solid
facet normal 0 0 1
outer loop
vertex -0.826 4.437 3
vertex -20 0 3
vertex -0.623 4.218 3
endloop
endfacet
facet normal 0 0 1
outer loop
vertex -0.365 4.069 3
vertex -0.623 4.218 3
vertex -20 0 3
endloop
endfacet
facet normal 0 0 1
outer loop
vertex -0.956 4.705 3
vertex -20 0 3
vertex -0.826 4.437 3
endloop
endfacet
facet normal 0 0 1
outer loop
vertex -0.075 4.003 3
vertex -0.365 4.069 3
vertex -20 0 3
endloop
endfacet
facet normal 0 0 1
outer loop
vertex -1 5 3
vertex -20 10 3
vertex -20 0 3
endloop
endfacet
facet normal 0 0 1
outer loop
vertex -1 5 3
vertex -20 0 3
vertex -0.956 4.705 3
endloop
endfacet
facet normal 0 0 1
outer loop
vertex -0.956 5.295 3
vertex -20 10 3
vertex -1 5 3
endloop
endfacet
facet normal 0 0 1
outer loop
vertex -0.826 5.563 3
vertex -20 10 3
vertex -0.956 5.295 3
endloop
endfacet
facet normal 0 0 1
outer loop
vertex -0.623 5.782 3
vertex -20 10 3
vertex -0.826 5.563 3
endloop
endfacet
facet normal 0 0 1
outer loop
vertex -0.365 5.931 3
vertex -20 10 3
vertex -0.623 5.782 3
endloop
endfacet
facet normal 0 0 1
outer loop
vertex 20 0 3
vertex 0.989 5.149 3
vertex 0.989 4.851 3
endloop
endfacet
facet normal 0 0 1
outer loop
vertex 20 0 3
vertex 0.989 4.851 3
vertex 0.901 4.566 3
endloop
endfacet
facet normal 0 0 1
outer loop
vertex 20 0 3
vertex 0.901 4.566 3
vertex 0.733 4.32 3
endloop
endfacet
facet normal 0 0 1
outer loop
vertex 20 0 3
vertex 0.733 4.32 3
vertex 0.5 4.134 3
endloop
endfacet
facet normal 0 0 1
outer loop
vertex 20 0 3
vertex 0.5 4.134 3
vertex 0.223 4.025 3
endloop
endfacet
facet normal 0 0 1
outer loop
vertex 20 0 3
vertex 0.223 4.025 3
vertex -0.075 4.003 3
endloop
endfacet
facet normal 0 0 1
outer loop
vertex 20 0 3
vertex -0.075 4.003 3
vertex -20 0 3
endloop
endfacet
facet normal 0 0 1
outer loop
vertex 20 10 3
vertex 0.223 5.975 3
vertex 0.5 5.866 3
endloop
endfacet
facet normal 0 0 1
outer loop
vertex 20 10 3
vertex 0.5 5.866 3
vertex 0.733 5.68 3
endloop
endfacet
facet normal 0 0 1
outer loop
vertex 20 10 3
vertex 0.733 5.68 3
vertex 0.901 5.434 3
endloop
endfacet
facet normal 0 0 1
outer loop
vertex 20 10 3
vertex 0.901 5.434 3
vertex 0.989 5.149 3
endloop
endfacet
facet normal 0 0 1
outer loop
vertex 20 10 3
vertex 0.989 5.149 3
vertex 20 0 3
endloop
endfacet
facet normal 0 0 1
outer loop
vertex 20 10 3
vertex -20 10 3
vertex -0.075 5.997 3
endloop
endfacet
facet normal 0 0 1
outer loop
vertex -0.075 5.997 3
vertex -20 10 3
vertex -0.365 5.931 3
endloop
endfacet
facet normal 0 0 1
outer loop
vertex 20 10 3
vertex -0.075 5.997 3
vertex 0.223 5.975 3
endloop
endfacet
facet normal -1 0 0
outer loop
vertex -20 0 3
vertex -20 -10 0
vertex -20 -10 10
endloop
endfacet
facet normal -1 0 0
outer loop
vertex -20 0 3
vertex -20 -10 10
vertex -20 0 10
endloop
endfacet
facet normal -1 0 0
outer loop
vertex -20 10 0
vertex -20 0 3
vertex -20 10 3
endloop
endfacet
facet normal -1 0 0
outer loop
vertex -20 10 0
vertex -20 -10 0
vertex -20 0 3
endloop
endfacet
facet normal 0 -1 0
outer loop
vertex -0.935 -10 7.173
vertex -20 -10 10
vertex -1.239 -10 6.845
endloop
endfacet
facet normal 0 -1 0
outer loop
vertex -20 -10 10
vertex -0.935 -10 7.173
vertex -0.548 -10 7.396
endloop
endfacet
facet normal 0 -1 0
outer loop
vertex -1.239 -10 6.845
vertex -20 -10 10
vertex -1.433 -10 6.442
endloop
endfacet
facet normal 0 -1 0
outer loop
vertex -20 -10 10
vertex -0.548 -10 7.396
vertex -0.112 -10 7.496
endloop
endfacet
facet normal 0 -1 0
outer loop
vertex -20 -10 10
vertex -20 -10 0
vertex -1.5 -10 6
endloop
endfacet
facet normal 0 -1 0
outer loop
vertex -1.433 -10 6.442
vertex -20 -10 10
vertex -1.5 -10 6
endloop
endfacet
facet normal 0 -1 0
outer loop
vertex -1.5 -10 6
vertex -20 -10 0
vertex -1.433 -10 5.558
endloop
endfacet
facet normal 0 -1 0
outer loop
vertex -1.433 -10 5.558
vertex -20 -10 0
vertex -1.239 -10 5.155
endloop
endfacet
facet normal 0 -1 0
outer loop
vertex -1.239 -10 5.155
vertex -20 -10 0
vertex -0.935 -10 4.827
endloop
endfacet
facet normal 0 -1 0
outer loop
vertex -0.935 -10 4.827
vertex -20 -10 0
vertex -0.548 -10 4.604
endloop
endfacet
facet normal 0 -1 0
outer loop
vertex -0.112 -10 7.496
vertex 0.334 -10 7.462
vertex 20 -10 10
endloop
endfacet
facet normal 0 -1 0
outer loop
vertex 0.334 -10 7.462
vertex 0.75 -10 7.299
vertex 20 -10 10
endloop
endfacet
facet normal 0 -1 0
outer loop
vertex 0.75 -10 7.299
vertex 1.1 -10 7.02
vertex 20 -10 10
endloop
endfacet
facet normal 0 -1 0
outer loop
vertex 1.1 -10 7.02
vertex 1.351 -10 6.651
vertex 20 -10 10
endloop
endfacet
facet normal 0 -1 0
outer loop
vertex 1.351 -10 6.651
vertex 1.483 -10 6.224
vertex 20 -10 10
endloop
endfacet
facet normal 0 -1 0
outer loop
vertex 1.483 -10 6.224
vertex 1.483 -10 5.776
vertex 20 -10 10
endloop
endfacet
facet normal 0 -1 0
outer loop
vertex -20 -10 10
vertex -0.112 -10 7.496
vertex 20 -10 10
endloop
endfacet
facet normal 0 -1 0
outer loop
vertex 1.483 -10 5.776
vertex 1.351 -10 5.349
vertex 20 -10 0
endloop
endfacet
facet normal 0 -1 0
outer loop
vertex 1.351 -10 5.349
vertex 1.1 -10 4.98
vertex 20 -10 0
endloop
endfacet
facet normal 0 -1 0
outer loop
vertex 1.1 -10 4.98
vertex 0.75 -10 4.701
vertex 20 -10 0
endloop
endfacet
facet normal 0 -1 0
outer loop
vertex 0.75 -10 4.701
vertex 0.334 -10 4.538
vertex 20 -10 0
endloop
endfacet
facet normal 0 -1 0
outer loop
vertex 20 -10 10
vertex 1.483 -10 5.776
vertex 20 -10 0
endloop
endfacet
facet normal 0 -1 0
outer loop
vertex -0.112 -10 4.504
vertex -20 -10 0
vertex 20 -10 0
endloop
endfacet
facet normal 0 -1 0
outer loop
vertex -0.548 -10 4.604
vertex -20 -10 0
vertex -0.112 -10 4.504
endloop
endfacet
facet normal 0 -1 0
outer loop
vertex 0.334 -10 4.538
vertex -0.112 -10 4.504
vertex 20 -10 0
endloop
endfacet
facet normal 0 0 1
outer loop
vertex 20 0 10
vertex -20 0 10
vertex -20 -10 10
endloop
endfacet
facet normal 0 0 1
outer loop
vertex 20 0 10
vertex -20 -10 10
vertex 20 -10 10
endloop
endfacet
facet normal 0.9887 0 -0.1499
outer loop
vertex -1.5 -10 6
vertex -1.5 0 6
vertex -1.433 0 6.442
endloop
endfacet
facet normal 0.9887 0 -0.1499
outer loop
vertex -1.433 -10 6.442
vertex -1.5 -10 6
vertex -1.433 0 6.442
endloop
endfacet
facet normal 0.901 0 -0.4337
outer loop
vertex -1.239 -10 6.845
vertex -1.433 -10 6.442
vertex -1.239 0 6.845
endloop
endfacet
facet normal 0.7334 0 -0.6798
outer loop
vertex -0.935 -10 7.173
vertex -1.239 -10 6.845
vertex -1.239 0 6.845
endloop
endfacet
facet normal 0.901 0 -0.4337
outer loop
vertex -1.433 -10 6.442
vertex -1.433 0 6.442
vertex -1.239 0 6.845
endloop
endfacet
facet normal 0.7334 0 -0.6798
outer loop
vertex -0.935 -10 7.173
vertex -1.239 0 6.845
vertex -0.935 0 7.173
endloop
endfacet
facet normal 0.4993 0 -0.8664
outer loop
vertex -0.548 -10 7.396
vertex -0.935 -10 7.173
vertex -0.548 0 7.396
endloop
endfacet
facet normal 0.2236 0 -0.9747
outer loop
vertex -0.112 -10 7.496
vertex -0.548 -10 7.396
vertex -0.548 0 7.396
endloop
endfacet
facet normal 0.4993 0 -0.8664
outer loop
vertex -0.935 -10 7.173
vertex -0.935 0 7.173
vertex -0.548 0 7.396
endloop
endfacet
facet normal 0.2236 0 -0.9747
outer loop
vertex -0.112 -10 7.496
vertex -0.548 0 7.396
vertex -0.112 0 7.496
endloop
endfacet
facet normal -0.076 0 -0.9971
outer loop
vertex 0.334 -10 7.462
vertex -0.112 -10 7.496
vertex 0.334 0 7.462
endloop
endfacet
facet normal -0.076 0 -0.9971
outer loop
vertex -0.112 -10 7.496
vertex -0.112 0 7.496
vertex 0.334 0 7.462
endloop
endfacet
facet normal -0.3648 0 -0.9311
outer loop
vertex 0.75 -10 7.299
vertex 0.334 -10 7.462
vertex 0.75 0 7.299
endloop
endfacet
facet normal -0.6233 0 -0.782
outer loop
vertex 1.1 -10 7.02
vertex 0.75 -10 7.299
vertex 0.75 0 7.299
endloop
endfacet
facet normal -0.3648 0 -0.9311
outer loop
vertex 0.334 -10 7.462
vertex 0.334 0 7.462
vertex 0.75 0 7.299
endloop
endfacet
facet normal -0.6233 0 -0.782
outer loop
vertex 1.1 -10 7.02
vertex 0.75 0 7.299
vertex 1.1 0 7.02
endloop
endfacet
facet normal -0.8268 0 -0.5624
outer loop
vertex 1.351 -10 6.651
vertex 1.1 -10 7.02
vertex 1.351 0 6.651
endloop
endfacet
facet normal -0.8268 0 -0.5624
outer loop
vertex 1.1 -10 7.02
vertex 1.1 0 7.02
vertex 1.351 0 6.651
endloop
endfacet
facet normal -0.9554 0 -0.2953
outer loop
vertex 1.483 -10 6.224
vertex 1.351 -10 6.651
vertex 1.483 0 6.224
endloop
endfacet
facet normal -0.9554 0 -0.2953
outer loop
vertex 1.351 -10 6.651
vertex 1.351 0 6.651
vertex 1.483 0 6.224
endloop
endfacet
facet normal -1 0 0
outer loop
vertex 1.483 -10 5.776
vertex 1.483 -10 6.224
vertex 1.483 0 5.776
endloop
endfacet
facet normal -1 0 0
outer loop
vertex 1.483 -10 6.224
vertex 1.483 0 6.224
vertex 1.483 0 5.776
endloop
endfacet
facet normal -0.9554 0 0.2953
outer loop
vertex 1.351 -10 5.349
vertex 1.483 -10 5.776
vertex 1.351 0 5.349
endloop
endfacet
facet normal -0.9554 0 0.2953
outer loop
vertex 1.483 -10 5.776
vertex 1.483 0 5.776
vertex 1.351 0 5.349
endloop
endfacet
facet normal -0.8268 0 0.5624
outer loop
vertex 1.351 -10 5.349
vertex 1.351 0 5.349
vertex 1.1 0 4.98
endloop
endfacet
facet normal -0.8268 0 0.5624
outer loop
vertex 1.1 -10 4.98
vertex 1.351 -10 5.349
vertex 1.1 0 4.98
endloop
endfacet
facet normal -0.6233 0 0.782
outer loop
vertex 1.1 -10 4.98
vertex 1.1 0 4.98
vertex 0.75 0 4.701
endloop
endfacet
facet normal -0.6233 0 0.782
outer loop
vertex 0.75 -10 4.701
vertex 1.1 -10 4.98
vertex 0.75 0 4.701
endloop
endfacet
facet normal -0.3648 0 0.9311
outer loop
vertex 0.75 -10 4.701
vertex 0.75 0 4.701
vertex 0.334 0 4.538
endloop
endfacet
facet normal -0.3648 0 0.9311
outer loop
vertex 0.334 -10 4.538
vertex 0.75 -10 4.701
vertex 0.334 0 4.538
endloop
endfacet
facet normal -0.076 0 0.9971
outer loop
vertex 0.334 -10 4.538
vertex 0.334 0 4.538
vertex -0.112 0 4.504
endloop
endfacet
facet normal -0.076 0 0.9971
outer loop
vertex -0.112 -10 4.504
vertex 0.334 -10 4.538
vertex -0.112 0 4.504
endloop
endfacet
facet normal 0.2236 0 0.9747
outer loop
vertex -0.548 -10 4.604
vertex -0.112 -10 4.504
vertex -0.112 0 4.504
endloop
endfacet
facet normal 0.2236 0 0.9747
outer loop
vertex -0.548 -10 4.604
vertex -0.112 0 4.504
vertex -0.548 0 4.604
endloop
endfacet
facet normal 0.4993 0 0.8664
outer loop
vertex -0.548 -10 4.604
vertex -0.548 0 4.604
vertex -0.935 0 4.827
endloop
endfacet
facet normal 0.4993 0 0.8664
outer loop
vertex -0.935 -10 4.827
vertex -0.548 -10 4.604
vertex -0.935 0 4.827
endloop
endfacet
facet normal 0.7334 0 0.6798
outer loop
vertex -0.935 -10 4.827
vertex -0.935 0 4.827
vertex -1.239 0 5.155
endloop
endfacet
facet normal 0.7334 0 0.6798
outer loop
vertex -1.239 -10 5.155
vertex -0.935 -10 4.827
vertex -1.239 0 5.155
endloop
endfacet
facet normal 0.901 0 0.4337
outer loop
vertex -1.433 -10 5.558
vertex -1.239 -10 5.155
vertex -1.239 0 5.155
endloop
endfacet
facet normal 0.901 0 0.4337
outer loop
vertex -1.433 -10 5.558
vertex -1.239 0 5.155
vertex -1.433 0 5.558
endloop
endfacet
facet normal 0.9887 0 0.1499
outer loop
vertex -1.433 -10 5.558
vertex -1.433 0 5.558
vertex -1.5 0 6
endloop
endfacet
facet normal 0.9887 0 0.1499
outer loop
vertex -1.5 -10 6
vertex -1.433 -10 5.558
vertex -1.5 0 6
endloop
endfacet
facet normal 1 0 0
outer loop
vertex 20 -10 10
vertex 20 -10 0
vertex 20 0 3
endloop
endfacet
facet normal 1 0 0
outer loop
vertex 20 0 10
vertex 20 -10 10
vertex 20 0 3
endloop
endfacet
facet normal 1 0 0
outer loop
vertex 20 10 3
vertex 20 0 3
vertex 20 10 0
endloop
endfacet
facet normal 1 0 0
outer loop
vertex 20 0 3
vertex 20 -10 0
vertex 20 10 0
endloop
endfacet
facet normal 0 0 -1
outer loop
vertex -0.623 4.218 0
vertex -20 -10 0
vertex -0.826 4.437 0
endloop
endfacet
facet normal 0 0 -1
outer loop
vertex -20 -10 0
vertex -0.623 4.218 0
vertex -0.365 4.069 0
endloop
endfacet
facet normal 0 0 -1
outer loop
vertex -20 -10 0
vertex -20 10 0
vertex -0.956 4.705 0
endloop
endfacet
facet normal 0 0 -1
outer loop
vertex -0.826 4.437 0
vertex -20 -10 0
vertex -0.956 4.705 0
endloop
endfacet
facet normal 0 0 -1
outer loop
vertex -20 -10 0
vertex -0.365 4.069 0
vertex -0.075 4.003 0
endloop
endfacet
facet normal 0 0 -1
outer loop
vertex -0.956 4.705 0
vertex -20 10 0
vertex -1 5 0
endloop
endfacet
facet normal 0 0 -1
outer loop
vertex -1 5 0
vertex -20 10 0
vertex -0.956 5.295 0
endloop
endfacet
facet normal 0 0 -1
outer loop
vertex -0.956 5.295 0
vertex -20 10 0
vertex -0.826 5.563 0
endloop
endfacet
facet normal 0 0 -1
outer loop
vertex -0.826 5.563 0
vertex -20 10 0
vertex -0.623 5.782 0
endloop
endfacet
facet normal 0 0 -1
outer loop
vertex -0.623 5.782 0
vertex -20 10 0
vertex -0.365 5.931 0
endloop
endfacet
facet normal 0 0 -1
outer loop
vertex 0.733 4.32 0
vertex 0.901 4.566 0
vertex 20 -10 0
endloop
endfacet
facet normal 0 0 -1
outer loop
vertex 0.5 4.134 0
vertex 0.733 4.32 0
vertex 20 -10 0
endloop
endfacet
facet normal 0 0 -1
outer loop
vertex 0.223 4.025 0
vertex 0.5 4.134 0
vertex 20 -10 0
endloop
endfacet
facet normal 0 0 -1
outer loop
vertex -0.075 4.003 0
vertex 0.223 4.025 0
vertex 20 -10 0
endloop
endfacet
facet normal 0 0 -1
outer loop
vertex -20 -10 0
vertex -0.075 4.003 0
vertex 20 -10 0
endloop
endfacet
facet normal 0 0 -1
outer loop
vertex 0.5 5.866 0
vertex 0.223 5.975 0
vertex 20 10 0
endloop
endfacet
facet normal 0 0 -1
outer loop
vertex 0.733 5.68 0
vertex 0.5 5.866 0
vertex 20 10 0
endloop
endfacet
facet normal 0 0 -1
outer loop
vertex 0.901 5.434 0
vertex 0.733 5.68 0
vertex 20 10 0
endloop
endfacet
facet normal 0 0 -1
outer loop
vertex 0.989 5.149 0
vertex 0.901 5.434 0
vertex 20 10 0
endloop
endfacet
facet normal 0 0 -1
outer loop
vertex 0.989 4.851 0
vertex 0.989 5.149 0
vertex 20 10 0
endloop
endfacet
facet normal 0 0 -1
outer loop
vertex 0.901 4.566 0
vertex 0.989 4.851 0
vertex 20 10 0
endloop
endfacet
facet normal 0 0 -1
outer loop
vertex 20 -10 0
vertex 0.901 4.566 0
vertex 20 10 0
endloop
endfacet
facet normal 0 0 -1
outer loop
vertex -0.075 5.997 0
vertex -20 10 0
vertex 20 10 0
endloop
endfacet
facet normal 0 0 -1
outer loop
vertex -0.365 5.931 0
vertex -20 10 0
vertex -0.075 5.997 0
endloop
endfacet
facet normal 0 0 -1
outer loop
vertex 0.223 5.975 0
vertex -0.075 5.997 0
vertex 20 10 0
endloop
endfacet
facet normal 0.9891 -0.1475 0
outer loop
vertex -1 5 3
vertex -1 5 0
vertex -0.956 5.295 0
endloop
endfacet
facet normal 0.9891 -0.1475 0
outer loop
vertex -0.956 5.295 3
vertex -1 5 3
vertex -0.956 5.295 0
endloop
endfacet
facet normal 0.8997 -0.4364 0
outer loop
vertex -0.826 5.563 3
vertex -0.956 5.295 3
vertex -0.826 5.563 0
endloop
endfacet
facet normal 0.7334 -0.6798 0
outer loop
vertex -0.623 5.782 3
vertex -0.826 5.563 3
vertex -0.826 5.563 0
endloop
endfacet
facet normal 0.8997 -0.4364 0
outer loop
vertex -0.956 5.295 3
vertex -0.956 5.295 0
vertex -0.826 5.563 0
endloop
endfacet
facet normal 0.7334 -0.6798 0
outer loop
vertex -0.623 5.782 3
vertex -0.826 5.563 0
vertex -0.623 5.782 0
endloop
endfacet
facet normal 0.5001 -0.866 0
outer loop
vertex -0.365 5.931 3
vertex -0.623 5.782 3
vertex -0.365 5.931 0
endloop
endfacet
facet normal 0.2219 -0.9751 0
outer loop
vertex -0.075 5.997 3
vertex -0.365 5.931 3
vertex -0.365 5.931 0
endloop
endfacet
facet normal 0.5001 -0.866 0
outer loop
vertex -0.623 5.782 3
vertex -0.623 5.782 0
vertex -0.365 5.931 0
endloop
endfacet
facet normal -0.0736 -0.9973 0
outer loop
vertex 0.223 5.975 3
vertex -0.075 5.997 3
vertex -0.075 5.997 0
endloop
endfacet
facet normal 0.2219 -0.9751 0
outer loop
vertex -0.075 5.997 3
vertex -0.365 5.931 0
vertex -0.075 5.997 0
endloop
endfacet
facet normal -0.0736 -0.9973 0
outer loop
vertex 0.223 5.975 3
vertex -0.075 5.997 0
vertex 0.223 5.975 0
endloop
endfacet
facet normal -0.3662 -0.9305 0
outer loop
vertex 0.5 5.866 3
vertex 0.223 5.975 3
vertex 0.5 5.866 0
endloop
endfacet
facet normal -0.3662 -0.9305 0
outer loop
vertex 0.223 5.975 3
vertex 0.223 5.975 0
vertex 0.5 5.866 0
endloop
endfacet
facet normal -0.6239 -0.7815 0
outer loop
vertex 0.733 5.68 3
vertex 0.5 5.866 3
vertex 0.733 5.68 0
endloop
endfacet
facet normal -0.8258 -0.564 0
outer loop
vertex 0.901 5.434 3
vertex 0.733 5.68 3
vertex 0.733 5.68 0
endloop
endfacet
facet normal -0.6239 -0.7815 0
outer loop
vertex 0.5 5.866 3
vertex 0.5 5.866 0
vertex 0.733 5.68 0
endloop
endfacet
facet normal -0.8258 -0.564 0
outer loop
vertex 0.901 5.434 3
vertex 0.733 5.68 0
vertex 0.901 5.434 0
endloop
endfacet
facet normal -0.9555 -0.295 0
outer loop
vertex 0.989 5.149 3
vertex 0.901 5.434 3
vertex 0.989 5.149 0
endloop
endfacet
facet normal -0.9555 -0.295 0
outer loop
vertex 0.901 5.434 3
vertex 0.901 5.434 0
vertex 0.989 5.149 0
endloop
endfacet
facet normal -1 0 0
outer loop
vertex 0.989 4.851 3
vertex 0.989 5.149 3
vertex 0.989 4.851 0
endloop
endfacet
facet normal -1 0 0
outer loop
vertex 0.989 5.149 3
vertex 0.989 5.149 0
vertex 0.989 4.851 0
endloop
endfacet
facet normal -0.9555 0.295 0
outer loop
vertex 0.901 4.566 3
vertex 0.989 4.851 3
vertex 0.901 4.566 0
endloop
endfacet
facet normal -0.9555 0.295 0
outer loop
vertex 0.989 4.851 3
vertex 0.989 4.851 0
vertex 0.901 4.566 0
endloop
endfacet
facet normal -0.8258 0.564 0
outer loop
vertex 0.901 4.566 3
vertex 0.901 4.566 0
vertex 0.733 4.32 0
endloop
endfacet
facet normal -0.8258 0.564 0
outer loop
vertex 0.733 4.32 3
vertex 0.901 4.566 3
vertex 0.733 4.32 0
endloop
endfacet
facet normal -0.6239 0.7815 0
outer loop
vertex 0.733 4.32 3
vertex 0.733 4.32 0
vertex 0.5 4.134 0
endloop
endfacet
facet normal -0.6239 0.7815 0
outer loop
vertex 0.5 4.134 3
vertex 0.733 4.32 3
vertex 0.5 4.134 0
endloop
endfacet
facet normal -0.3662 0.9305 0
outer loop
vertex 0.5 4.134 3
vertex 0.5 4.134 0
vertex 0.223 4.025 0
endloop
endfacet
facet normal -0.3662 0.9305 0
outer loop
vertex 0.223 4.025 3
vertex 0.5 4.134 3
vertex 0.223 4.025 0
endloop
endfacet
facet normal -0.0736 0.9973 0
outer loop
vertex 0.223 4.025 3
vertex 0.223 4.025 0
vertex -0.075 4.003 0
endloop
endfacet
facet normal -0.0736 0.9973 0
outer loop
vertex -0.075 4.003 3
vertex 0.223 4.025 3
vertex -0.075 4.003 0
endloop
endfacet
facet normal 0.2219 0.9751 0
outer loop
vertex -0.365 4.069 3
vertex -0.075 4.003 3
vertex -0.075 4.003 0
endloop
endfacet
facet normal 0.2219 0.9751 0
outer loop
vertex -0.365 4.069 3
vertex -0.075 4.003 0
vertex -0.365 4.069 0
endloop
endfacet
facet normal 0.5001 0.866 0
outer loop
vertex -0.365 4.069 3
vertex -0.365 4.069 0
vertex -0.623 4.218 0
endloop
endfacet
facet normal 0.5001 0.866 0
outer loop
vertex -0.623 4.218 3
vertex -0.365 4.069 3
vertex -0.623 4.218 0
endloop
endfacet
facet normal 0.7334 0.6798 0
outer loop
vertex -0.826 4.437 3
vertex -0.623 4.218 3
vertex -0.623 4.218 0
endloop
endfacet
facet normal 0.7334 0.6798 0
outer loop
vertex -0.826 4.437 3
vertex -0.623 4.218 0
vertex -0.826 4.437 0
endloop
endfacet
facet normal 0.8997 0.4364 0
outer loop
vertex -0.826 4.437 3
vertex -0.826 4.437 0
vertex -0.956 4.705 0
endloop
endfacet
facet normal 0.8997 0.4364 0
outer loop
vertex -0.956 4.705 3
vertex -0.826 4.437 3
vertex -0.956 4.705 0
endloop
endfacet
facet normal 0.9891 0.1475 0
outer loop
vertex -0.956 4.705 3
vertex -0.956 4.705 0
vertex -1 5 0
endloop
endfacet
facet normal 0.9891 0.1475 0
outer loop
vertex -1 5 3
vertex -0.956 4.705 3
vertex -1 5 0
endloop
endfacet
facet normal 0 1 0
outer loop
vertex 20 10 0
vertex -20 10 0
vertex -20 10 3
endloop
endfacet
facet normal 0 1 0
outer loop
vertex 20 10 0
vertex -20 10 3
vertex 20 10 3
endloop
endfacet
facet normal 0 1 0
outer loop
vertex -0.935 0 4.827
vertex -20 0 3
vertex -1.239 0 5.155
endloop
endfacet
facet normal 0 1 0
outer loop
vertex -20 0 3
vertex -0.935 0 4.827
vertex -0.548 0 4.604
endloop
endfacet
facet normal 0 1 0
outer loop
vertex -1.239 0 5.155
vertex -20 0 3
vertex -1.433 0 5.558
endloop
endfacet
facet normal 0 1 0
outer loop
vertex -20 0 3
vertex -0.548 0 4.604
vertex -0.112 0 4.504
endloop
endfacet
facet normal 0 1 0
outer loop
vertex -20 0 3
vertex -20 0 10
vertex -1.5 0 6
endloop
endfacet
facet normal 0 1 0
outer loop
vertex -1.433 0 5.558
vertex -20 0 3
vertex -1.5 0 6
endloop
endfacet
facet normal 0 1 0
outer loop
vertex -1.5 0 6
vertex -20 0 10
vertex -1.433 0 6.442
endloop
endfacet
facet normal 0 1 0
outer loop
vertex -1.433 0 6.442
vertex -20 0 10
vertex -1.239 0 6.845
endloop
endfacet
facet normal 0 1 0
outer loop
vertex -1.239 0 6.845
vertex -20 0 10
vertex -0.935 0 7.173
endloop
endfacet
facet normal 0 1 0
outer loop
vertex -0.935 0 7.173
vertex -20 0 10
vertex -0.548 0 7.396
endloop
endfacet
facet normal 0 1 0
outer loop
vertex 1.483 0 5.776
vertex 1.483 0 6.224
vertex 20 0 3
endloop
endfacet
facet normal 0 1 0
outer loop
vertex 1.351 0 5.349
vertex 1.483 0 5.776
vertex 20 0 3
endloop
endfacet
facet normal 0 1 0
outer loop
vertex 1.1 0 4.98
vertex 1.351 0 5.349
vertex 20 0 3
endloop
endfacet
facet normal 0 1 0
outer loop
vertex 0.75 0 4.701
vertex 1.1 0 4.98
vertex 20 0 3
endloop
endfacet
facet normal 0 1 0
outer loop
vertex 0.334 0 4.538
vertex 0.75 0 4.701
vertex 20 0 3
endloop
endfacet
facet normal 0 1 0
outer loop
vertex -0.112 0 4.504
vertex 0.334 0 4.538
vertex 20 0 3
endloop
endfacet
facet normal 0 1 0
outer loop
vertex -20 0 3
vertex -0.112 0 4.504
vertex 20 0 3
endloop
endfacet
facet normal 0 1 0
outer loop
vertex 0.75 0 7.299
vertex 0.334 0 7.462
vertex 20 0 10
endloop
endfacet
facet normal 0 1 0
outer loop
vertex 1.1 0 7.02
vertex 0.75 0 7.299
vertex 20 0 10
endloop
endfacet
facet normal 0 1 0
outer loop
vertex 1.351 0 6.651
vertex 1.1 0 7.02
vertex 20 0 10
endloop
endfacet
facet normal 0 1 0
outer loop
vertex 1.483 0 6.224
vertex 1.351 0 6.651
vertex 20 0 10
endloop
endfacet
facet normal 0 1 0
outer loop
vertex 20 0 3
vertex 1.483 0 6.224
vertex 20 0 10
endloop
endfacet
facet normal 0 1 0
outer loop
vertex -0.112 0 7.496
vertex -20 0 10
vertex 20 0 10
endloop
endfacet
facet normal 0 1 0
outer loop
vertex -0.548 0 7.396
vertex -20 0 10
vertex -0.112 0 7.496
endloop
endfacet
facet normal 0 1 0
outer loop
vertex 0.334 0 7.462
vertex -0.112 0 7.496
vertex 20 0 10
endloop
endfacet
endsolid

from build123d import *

# Parameters (mm, degrees)
F0_W     = 40
F0_H     = 20
F1_DEPTH = 10
F2_W     = 40
F2_H     = 10
F3_DEPTH = 7
F5_D     = 3
F7_D     = 2


with BuildPart() as f1:
    # F0 (on Top) → F1 (new body)
    with BuildSketch(Plane.XY):
        Rectangle(F0_W, F0_H)
    extrude(amount=F1_DEPTH)

    # F2 (on face) → F3 (cut)
    with BuildSketch(Plane.XY.offset(10)):
        with Locations((0, 5)):
            Rectangle(F2_W, F2_H)
    extrude(amount=-F3_DEPTH, mode=Mode.SUBTRACT)

    # F5 (through all)
    with Locations(Plane.XZ.offset(10)):
        with Locations((0, 6)):
            Hole(F5_D / 2)

    # F7 (through all)
    with Locations(Plane.XY.offset(3)):
        with Locations((0, 5)):
            Hole(F7_D / 2)


solid = f1.part
